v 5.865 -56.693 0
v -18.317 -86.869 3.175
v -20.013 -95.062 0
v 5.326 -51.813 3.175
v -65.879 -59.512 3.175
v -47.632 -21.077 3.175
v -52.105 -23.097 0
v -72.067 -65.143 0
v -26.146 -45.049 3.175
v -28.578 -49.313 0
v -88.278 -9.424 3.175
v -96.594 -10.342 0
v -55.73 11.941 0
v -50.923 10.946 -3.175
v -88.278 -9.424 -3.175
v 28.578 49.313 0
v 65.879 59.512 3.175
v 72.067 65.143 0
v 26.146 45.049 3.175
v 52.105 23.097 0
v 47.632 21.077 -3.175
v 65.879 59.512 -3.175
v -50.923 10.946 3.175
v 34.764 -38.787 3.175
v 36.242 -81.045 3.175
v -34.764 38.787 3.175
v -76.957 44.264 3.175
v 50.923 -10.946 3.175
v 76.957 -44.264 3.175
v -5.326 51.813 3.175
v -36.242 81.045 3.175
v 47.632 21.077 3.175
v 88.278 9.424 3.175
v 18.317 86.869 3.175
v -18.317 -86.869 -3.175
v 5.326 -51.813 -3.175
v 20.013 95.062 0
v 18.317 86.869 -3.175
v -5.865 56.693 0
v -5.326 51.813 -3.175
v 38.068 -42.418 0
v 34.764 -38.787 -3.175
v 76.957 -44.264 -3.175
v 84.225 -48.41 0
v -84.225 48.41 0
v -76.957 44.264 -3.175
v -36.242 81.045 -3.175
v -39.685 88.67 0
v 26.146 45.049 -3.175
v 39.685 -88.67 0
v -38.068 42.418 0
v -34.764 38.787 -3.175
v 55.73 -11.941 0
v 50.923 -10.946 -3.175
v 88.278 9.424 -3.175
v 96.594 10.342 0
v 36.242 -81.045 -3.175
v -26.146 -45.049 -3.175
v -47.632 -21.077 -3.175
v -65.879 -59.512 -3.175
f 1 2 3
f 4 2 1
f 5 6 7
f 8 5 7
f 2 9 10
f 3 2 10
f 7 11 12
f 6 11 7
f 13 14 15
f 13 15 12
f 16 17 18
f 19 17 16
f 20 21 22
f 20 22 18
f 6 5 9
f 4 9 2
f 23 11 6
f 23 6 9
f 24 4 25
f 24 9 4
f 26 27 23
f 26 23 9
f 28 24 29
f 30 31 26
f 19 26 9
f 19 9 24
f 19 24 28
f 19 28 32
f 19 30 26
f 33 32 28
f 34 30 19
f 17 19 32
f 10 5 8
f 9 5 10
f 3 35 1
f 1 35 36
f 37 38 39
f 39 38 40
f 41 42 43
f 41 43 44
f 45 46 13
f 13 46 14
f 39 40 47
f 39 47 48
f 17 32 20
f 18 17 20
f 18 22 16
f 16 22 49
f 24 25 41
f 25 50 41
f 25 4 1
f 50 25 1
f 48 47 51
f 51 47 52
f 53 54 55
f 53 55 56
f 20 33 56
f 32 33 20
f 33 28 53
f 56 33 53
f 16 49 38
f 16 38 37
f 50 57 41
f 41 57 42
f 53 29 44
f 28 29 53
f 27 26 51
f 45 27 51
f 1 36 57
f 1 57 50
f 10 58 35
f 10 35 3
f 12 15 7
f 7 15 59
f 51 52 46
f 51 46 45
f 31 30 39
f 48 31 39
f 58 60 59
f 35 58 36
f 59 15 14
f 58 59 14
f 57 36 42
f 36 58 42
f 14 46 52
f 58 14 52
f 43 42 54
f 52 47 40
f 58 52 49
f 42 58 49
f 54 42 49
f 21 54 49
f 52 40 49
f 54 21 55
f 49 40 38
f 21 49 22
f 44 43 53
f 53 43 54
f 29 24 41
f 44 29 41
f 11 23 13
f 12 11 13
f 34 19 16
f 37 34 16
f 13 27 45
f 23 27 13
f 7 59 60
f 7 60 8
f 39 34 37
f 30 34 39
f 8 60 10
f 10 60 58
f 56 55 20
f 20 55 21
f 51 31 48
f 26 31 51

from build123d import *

# Parameters (mm, degrees)
F1_DEPTH = 3.175
F2_SIZE  = 3.17499


# Not quite as in the source:
# - a fillet or chamfer is up to 0.001 mm smaller than in the source, because OpenCascade refuses the exact size


with BuildPart() as f1:
    # F0 (on Top) → F1 (new body, symmetric)
    with BuildSketch(Plane.XY):
        with BuildLine():
            Line((28.5780178367, 49.3127499276), (9.3443886308, 42.3114214845))
            Line((9.3443886308, 42.3114214845), (19.4354125913, 32.7700280349))
            ThreePointArc((19.4354125913, 32.7700280349), (19.9071953157, 32.4855902619), (20.374816102, 32.1943608231))
            Line((20.374816102, 32.1943608231), (32.4297987565, 28.7381652083))
            Line((32.4297987565, 28.7381652083), (28.5780178367, 49.3127499276))
        make_face()
        Polygon((17.3102603478, -39.723152866), (5.865205062, -56.692590155), (39.6851250968, -88.6704315269), (38.068118978, -42.4177878534), align=None)
        with BuildLine():
            Line((55.7303053322, -11.9408323194), (43.1281280055, 4.1879065968))
            Line((43.1281280055, 4.1879065968), (37.1720214851, -8.3576802229))
            ThreePointArc((37.1720214851, -8.3576802229), (37.0472939672, -8.8942683629), (36.9148210816, -9.4289970047))
            Line((36.9148210816, -9.4289970047), (37.3529782276, -21.961989993))
            Line((37.3529782276, -21.961989993), (55.7303053322, -11.9408323194))
        make_face()
        Polygon((-39.6851250968, 88.6704315269), (-38.068118978, 42.4177878534), (-17.3102603478, 39.723152866), (-5.865205062, 56.692590155), align=None)
        with BuildLine():
            Line((52.1054092529, 23.0971153067), (32.4297987565, 28.7381652083))
            Line((32.4297987565, 28.7381652083), (34.9853182751, 15.087660693))
            ThreePointArc((34.9853182751, 15.087660693), (35.1998101887, 14.5802387731), (35.4069429826, 14.069768606))
            Line((35.4069429826, 14.069768606), (43.1281280055, 4.1879065968))
            Line((43.1281280055, 4.1879065968), (52.1054092529, 23.0971153067))
        make_face()
        Polygon((37.3529782276, -21.961989993), (38.068118978, -42.4177878534), (84.2251125931, -48.4095547365), (55.7303053322, -11.9408323194), align=None)
        with BuildLine():
            ThreePointArc((25.1602759184, -28.6106713607), (24.7439706414, -28.9714672894), (24.322492216, -29.3262062395))
            Line((24.322492216, -29.3262062395), (17.3102603478, -39.723152866))
            Line((17.3102603478, -39.723152866), (38.068118978, -42.4177878534))
            Line((38.068118978, -42.4177878534), (37.3529782276, -21.961989993))
            Line((37.3529782276, -21.961989993), (25.1602759184, -28.6106713607))
        make_face()
        Polygon((-55.7303053322, 11.9408323194), (-37.3529782276, 21.961989993), (-38.068118978, 42.4177878534), (-84.2251125931, 48.4095547365), align=None)
        Polygon((96.5939697852, 10.342126583), (52.1054092529, 23.0971153067), (43.1281280055, 4.1879065968), (55.7303053322, -11.9408323194), align=None)
        with BuildLine():
            ThreePointArc((3.5381601171, -37.9353584797), (2.9892915472, -37.9825504152), (2.4397980151, -38.0218014519))
            Line((2.4397980151, -38.0218014519), (-9.3443886308, -42.3114214845))
            Line((-9.3443886308, -42.3114214845), (5.865205062, -56.692590155))
            Line((5.865205062, -56.692590155), (17.3102603478, -39.723152866))
            Line((17.3102603478, -39.723152866), (3.5381601171, -37.9353584797))
        make_face()
        Polygon((20.0132313387, 95.0622172711), (-5.865205062, 56.692590155), (9.3443886308, 42.3114214845), (28.5780178367, 49.3127499276), align=None)
        with BuildLine():
            Line((-38.068118978, 42.4177878534), (-37.3529782276, 21.961989993))
            Line((-37.3529782276, 21.961989993), (-25.1602759184, 28.6106713607))
            ThreePointArc((-25.1602759184, 28.6106713607), (-24.7439706414, 28.9714672894), (-24.322492216, 29.3262062395))
            Line((-24.322492216, 29.3262062395), (-17.3102603478, 39.723152866))
            Line((-17.3102603478, 39.723152866), (-38.068118978, 42.4177878534))
        make_face()
        Polygon((72.0672136275, 65.1434670637), (28.5780178367, 49.3127499276), (32.4297987565, 28.7381652083), (52.1054092529, 23.0971153067), align=None)
        with BuildLine():
            ThreePointArc((-19.4354125913, -32.7700280349), (-19.9071953157, -32.4855902619), (-20.374816102, -32.1943608231))
            Line((-20.374816102, -32.1943608231), (-32.4297987565, -28.7381652083))
            Line((-32.4297987565, -28.7381652083), (-28.5780178367, -49.3127499276))
            Line((-28.5780178367, -49.3127499276), (-9.3443886308, -42.3114214845))
            Line((-9.3443886308, -42.3114214845), (-19.4354125913, -32.7700280349))
        make_face()
        Polygon((-52.1054092529, -23.0971153067), (-43.1281280055, -4.1879065968), (-55.7303053322, 11.9408323194), (-96.5939697852, -10.342126583), align=None)
        with BuildLine():
            ThreePointArc((-34.9853182751, -15.087660693), (-35.1998101887, -14.5802387731), (-35.4069429826, -14.069768606))
            Line((-35.4069429826, -14.069768606), (-43.1281280055, -4.1879065968))
            Line((-43.1281280055, -4.1879065968), (-52.1054092529, -23.0971153067))
            Line((-52.1054092529, -23.0971153067), (-32.4297987565, -28.7381652083))
            Line((-32.4297987565, -28.7381652083), (-34.9853182751, -15.087660693))
        make_face()
        Polygon((-32.4297987565, -28.7381652083), (-52.1054092529, -23.0971153067), (-72.0672136275, -65.1434670637), (-28.5780178367, -49.3127499276), align=None)
        with BuildLine():
            ThreePointArc((-37.1720214851, 8.3576802229), (-37.0472939672, 8.8942683629), (-36.9148210816, 9.4289970047))
            Line((-36.9148210816, 9.4289970047), (-37.3529782276, 21.961989993))
            Line((-37.3529782276, 21.961989993), (-55.7303053322, 11.9408323194))
            Line((-55.7303053322, 11.9408323194), (-43.1281280055, -4.1879065968))
            Line((-43.1281280055, -4.1879065968), (-37.1720214851, 8.3576802229))
        make_face()
        Polygon((-9.3443886308, -42.3114214845), (-28.5780178367, -49.3127499276), (-20.0132313387, -95.0622172711), (5.865205062, -56.692590155), align=None)
        with BuildLine():
            Line((-5.865205062, 56.692590155), (-17.3102603478, 39.723152866))
            Line((-17.3102603478, 39.723152866), (-3.5381601171, 37.9353584797))
            ThreePointArc((-3.5381601171, 37.9353584797), (-2.9892915472, 37.9825504152), (-2.4397980151, 38.0218014519))
            Line((-2.4397980151, 38.0218014519), (9.3443886308, 42.3114214845))
            Line((9.3443886308, 42.3114214845), (-5.865205062, 56.692590155))
        make_face()
        with BuildLine():
            ThreePointArc((-25.1602759184, 28.6106713607), (-32.4855902619, 19.9071953157), (-36.9148210816, 9.4289970047))
            ThreePointArc((-36.9148210816, 9.4289970047), (-37.0472939672, 8.8942683629), (-37.1720214851, 8.3576802229))
            ThreePointArc((-37.1720214851, 8.3576802229), (-37.9825504152, -2.9892915472), (-35.4069429826, -14.069768606))
            ThreePointArc((-35.4069429826, -14.069768606), (-35.1998101887, -14.5802387731), (-34.9853182751, -15.087660693))
            ThreePointArc((-34.9853182751, -15.087660693), (-28.9714672894, -24.7439706414), (-20.374816102, -32.1943608231))
            ThreePointArc((-20.374816102, -32.1943608231), (-19.9071953157, -32.4855902619), (-19.4354125913, -32.7700280349))
            ThreePointArc((-19.4354125913, -32.7700280349), (-8.8942683629, -37.0472939672), (2.4397980151, -38.0218014519))
            ThreePointArc((2.4397980151, -38.0218014519), (2.9892915472, -37.9825504152), (3.5381601171, -37.9353584797))
            ThreePointArc((3.5381601171, -37.9353584797), (14.5802387731, -35.1998101887), (24.322492216, -29.3262062395))
            ThreePointArc((24.322492216, -29.3262062395), (24.7439706414, -28.9714672894), (25.1602759184, -28.6106713607))
            ThreePointArc((25.1602759184, -28.6106713607), (32.4855902619, -19.9071953157), (36.9148210816, -9.4289970047))
            ThreePointArc((36.9148210816, -9.4289970047), (37.0472939672, -8.8942683629), (37.1720214851, -8.3576802229))
            ThreePointArc((37.1720214851, -8.3576802229), (37.9825504152, 2.9892915472), (35.4069429826, 14.069768606))
            ThreePointArc((35.4069429826, 14.069768606), (35.1998101887, 14.5802387731), (34.9853182751, 15.087660693))
            ThreePointArc((34.9853182751, 15.087660693), (28.9714672894, 24.7439706414), (20.374816102, 32.1943608231))
            ThreePointArc((20.374816102, 32.1943608231), (19.9071953157, 32.4855902619), (19.4354125913, 32.7700280349))
            ThreePointArc((19.4354125913, 32.7700280349), (8.8942683629, 37.0472939672), (-2.4397980151, 38.0218014519))
            ThreePointArc((-2.4397980151, 38.0218014519), (-2.9892915472, 37.9825504152), (-3.5381601171, 37.9353584797))
            ThreePointArc((-3.5381601171, 37.9353584797), (-14.5802387731, 35.1998101887), (-24.322492216, 29.3262062395))
            ThreePointArc((-24.322492216, 29.3262062395), (-24.7439706414, 28.9714672894), (-25.1602759184, 28.6106713607))
        make_face()
        with BuildLine():
            ThreePointArc((-20.374816102, -32.1943608231), (-28.9714672894, -24.7439706414), (-34.9853182751, -15.087660693))
            Line((-34.9853182751, -15.087660693), (-32.4297987565, -28.7381652083))
            Line((-32.4297987565, -28.7381652083), (-20.374816102, -32.1943608231))
        make_face()
        with BuildLine():
            ThreePointArc((2.4397980151, -38.0218014519), (-8.8942683629, -37.0472939672), (-19.4354125913, -32.7700280349))
            Line((-19.4354125913, -32.7700280349), (-9.3443886308, -42.3114214845))
            Line((-9.3443886308, -42.3114214845), (2.4397980151, -38.0218014519))
        make_face()
        with BuildLine():
            ThreePointArc((24.322492216, -29.3262062395), (14.5802387731, -35.1998101887), (3.5381601171, -37.9353584797))
            Line((3.5381601171, -37.9353584797), (17.3102603478, -39.723152866))
            Line((17.3102603478, -39.723152866), (24.322492216, -29.3262062395))
        make_face()
        with BuildLine():
            ThreePointArc((36.9148210816, -9.4289970047), (32.4855902619, -19.9071953157), (25.1602759184, -28.6106713607))
            Line((25.1602759184, -28.6106713607), (37.3529782276, -21.961989993))
            Line((37.3529782276, -21.961989993), (36.9148210816, -9.4289970047))
        make_face()
        with BuildLine():
            Line((43.1281280055, 4.1879065968), (35.4069429826, 14.069768606))
            ThreePointArc((35.4069429826, 14.069768606), (37.9825504152, 2.9892915472), (37.1720214851, -8.3576802229))
            Line((37.1720214851, -8.3576802229), (43.1281280055, 4.1879065968))
        make_face()
        with BuildLine():
            Line((32.4297987565, 28.7381652083), (20.374816102, 32.1943608231))
            ThreePointArc((20.374816102, 32.1943608231), (28.9714672894, 24.7439706414), (34.9853182751, 15.087660693))
            Line((34.9853182751, 15.087660693), (32.4297987565, 28.7381652083))
        make_face()
        with BuildLine():
            Line((9.3443886308, 42.3114214845), (-2.4397980151, 38.0218014519))
            ThreePointArc((-2.4397980151, 38.0218014519), (8.8942683629, 37.0472939672), (19.4354125913, 32.7700280349))
            Line((19.4354125913, 32.7700280349), (9.3443886308, 42.3114214845))
        make_face()
        with BuildLine():
            Line((-17.3102603478, 39.723152866), (-24.322492216, 29.3262062395))
            ThreePointArc((-24.322492216, 29.3262062395), (-14.5802387731, 35.1998101887), (-3.5381601171, 37.9353584797))
            Line((-3.5381601171, 37.9353584797), (-17.3102603478, 39.723152866))
        make_face()
        with BuildLine():
            ThreePointArc((-35.4069429826, -14.069768606), (-37.9825504152, -2.9892915472), (-37.1720214851, 8.3576802229))
            Line((-37.1720214851, 8.3576802229), (-43.1281280055, -4.1879065968))
            Line((-43.1281280055, -4.1879065968), (-35.4069429826, -14.069768606))
        make_face()
        with BuildLine():
            Line((-37.3529782276, 21.961989993), (-36.9148210816, 9.4289970047))
            ThreePointArc((-36.9148210816, 9.4289970047), (-32.4855902619, 19.9071953157), (-25.1602759184, 28.6106713607))
            Line((-25.1602759184, 28.6106713607), (-37.3529782276, 21.961989993))
        make_face()
    extrude(amount=F1_DEPTH, both=True)

    # F2 (size 3.175 in the source; OpenCascade refuses exactly that, so slightly less here)
    f2_edges = [f1.edges().sort_by_distance(p)[0] for p in [
        (22.775165, -72.681511, 3.175),
        (38.876622, -65.54411, 3.175),
        (61.146616, -45.413671, 3.175),
        (69.977709, -30.175194, 3.175),
        (76.162138, -0.799353, 3.175),
        (74.34969, 16.719621, 3.175),
        (62.086311, 44.120291, 3.175),
        (50.322616, 57.228108, 3.175),
        (24.295625, 72.187484, 3.175),
        (7.074013, 75.877404, 3.175),
        (-22.775165, 72.681511, 3.175),
        (-38.876622, 65.54411, 3.175),
        (-61.146616, 45.413671, 3.175),
        (-69.977709, 30.175194, 3.175),
        (-76.162138, 0.799353, 3.175),
        (-74.34969, -16.719621, 3.175),
        (-62.086311, -44.120291, 3.175),
        (-50.322616, -57.228108, 3.175),
        (-24.295625, -72.187484, 3.175),
        (-7.074013, -75.877404, 3.175),
        (22.775165, -72.681511, -3.175),
        (38.876622, -65.54411, -3.175),
        (61.146616, -45.413671, -3.175),
        (69.977709, -30.175194, -3.175),
        (76.162138, -0.799353, -3.175),
        (74.34969, 16.719621, -3.175),
        (62.086311, 44.120291, -3.175),
        (50.322616, 57.228108, -3.175),
        (24.295625, 72.187484, -3.175),
        (7.074013, 75.877404, -3.175),
        (-22.775165, 72.681511, -3.175),
        (-38.876622, 65.54411, -3.175),
        (-61.146616, 45.413671, -3.175),
        (-69.977709, 30.175194, -3.175),
        (-76.162138, 0.799353, -3.175),
        (-74.34969, -16.719621, -3.175),
        (-62.086311, -44.120291, -3.175),
        (-50.322616, -57.228108, -3.175),
        (-24.295625, -72.187484, -3.175),
        (-7.074013, -75.877404, -3.175),
    ]]
    chamfer(f2_edges, length=F2_SIZE)


solid = f1.part
